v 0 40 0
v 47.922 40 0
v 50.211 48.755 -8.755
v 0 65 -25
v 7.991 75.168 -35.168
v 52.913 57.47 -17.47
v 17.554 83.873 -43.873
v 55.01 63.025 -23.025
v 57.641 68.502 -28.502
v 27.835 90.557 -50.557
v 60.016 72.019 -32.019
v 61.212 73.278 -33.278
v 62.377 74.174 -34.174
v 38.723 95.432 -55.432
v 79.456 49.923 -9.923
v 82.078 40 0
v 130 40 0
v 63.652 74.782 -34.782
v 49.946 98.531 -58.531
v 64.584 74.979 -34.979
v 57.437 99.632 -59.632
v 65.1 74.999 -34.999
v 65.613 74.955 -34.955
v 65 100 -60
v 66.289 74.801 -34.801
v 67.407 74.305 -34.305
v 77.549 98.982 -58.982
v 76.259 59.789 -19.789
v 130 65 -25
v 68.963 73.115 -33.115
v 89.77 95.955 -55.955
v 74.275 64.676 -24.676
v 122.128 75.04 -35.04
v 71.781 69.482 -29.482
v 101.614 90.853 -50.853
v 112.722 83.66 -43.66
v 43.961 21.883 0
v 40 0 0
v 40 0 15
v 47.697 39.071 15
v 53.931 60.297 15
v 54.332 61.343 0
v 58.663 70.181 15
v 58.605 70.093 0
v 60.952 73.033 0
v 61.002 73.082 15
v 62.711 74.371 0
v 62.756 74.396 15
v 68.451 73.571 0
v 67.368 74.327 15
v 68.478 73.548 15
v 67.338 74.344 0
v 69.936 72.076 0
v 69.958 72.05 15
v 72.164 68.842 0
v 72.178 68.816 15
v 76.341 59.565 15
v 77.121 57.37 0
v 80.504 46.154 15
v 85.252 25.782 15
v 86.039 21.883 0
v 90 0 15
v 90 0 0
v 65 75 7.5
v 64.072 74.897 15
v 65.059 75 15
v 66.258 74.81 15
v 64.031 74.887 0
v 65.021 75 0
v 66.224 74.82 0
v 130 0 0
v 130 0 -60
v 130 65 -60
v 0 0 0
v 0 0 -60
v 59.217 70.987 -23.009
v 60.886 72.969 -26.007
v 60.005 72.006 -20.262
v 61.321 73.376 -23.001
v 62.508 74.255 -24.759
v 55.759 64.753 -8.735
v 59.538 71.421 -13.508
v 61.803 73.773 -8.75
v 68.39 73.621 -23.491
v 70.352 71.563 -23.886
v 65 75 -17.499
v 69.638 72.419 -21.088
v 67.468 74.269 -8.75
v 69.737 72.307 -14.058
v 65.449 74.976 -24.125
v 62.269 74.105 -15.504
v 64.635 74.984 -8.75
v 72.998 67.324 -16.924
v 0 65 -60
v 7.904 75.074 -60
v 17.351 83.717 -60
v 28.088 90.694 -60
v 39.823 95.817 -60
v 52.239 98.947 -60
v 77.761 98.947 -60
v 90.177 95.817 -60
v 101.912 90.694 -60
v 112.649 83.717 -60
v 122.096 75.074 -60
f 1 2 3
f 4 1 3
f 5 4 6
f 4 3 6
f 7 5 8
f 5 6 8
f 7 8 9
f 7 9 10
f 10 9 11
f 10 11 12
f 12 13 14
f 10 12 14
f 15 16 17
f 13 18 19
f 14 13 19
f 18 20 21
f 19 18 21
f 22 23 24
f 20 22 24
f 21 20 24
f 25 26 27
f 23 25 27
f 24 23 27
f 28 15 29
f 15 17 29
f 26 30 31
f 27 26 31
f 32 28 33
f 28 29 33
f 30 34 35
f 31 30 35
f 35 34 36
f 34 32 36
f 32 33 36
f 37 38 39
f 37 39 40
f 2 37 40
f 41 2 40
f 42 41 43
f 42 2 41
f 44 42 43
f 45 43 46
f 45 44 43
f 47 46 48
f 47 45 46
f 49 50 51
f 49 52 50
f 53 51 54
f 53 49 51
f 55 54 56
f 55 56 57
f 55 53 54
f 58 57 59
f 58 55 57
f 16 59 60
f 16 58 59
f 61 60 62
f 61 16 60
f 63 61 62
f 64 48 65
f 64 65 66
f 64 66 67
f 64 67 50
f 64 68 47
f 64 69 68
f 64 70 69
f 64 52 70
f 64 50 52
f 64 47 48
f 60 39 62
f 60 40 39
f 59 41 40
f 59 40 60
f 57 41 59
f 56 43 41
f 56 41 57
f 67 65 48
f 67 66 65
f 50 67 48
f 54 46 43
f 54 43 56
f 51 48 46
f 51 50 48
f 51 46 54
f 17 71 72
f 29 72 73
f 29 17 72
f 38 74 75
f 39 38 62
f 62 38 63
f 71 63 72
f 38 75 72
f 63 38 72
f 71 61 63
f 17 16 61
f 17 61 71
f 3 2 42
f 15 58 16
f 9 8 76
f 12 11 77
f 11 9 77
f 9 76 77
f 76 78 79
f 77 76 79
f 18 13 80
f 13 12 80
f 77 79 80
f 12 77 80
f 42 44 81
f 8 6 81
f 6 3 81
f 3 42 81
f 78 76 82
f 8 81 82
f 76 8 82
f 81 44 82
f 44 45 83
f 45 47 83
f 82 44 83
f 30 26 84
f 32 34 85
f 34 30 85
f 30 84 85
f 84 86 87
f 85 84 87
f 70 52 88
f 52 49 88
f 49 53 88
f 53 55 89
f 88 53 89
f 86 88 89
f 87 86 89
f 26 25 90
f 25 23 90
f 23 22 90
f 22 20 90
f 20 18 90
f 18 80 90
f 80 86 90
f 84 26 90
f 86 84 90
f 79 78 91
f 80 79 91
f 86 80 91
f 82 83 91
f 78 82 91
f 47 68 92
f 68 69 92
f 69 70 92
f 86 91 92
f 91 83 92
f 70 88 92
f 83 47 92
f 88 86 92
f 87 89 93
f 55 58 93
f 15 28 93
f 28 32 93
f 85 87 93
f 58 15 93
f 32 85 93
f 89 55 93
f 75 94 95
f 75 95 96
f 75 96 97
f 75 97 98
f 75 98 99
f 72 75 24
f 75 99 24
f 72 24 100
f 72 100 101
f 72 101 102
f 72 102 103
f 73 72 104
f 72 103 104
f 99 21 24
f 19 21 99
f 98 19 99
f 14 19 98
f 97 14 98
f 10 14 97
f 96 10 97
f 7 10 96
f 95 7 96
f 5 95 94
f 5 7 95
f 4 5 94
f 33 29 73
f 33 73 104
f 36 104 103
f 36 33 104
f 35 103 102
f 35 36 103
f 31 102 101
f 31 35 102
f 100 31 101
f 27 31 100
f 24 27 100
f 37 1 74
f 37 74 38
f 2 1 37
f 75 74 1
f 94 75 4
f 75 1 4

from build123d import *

# Parameters (mm, degrees)
SKETCH1_W           = 130
SKETCH1_H           = 100
EXTRUDE1_DEPTH      = 60
CUT_EXTRUDE1_DEPTH  = 61
CUT_EXTRUDE2_DEPTH  = 131
EXTRUDE2_DEPTH      = 15
EXTRUDE2_DEPTH_BACK = 55


with BuildPart() as part:
    # Sketch1 → Extrude1 (new body)
    with BuildSketch(Plane.XY):
        with Locations((65, 50)):
            Rectangle(SKETCH1_W, SKETCH1_H)
    extrude(amount=-EXTRUDE1_DEPTH)

    # Sketch2 → Cut-Extrude1 (cut, through all)
    with BuildSketch(Plane.XY):
        with BuildLine():
            Line((0, 65), (0, 111.499593367))
            Line((0, 111.499593367), (130, 111.499593367))
            Line((130, 111.499593367), (130, 65))
            ThreePointArc((130, 65), (65, 100), (0, 65))
        make_face()
    extrude(amount=-CUT_EXTRUDE1_DEPTH, mode=Mode.SUBTRACT)

    # Sketch3 → Cut-Extrude2 (cut, through all)
    with BuildSketch(Plane(origin=(130, 0, 0), x_dir=(0, 0, -1), z_dir=(1, 0, 0))):
        Polygon((0, 40), (60, 100), (0, 100), align=None)
    extrude(amount=-CUT_EXTRUDE2_DEPTH, mode=Mode.SUBTRACT)

    # Sketch4 → Extrude2 (add, two sides)
    with BuildSketch(Plane.XY) as extrude2_sk:
        with BuildLine():
            Line((40, 0), (90, 0))
            add(Edge.make_bspline(
                [(40, 0), (65, 150), (90, 0)],
                knots=[0, 0, 0, 1, 1, 1], degree=2))
        make_face()
    extrude(amount=EXTRUDE2_DEPTH)
    extrude(extrude2_sk.sketch, amount=-EXTRUDE2_DEPTH_BACK)


solid = part.part
